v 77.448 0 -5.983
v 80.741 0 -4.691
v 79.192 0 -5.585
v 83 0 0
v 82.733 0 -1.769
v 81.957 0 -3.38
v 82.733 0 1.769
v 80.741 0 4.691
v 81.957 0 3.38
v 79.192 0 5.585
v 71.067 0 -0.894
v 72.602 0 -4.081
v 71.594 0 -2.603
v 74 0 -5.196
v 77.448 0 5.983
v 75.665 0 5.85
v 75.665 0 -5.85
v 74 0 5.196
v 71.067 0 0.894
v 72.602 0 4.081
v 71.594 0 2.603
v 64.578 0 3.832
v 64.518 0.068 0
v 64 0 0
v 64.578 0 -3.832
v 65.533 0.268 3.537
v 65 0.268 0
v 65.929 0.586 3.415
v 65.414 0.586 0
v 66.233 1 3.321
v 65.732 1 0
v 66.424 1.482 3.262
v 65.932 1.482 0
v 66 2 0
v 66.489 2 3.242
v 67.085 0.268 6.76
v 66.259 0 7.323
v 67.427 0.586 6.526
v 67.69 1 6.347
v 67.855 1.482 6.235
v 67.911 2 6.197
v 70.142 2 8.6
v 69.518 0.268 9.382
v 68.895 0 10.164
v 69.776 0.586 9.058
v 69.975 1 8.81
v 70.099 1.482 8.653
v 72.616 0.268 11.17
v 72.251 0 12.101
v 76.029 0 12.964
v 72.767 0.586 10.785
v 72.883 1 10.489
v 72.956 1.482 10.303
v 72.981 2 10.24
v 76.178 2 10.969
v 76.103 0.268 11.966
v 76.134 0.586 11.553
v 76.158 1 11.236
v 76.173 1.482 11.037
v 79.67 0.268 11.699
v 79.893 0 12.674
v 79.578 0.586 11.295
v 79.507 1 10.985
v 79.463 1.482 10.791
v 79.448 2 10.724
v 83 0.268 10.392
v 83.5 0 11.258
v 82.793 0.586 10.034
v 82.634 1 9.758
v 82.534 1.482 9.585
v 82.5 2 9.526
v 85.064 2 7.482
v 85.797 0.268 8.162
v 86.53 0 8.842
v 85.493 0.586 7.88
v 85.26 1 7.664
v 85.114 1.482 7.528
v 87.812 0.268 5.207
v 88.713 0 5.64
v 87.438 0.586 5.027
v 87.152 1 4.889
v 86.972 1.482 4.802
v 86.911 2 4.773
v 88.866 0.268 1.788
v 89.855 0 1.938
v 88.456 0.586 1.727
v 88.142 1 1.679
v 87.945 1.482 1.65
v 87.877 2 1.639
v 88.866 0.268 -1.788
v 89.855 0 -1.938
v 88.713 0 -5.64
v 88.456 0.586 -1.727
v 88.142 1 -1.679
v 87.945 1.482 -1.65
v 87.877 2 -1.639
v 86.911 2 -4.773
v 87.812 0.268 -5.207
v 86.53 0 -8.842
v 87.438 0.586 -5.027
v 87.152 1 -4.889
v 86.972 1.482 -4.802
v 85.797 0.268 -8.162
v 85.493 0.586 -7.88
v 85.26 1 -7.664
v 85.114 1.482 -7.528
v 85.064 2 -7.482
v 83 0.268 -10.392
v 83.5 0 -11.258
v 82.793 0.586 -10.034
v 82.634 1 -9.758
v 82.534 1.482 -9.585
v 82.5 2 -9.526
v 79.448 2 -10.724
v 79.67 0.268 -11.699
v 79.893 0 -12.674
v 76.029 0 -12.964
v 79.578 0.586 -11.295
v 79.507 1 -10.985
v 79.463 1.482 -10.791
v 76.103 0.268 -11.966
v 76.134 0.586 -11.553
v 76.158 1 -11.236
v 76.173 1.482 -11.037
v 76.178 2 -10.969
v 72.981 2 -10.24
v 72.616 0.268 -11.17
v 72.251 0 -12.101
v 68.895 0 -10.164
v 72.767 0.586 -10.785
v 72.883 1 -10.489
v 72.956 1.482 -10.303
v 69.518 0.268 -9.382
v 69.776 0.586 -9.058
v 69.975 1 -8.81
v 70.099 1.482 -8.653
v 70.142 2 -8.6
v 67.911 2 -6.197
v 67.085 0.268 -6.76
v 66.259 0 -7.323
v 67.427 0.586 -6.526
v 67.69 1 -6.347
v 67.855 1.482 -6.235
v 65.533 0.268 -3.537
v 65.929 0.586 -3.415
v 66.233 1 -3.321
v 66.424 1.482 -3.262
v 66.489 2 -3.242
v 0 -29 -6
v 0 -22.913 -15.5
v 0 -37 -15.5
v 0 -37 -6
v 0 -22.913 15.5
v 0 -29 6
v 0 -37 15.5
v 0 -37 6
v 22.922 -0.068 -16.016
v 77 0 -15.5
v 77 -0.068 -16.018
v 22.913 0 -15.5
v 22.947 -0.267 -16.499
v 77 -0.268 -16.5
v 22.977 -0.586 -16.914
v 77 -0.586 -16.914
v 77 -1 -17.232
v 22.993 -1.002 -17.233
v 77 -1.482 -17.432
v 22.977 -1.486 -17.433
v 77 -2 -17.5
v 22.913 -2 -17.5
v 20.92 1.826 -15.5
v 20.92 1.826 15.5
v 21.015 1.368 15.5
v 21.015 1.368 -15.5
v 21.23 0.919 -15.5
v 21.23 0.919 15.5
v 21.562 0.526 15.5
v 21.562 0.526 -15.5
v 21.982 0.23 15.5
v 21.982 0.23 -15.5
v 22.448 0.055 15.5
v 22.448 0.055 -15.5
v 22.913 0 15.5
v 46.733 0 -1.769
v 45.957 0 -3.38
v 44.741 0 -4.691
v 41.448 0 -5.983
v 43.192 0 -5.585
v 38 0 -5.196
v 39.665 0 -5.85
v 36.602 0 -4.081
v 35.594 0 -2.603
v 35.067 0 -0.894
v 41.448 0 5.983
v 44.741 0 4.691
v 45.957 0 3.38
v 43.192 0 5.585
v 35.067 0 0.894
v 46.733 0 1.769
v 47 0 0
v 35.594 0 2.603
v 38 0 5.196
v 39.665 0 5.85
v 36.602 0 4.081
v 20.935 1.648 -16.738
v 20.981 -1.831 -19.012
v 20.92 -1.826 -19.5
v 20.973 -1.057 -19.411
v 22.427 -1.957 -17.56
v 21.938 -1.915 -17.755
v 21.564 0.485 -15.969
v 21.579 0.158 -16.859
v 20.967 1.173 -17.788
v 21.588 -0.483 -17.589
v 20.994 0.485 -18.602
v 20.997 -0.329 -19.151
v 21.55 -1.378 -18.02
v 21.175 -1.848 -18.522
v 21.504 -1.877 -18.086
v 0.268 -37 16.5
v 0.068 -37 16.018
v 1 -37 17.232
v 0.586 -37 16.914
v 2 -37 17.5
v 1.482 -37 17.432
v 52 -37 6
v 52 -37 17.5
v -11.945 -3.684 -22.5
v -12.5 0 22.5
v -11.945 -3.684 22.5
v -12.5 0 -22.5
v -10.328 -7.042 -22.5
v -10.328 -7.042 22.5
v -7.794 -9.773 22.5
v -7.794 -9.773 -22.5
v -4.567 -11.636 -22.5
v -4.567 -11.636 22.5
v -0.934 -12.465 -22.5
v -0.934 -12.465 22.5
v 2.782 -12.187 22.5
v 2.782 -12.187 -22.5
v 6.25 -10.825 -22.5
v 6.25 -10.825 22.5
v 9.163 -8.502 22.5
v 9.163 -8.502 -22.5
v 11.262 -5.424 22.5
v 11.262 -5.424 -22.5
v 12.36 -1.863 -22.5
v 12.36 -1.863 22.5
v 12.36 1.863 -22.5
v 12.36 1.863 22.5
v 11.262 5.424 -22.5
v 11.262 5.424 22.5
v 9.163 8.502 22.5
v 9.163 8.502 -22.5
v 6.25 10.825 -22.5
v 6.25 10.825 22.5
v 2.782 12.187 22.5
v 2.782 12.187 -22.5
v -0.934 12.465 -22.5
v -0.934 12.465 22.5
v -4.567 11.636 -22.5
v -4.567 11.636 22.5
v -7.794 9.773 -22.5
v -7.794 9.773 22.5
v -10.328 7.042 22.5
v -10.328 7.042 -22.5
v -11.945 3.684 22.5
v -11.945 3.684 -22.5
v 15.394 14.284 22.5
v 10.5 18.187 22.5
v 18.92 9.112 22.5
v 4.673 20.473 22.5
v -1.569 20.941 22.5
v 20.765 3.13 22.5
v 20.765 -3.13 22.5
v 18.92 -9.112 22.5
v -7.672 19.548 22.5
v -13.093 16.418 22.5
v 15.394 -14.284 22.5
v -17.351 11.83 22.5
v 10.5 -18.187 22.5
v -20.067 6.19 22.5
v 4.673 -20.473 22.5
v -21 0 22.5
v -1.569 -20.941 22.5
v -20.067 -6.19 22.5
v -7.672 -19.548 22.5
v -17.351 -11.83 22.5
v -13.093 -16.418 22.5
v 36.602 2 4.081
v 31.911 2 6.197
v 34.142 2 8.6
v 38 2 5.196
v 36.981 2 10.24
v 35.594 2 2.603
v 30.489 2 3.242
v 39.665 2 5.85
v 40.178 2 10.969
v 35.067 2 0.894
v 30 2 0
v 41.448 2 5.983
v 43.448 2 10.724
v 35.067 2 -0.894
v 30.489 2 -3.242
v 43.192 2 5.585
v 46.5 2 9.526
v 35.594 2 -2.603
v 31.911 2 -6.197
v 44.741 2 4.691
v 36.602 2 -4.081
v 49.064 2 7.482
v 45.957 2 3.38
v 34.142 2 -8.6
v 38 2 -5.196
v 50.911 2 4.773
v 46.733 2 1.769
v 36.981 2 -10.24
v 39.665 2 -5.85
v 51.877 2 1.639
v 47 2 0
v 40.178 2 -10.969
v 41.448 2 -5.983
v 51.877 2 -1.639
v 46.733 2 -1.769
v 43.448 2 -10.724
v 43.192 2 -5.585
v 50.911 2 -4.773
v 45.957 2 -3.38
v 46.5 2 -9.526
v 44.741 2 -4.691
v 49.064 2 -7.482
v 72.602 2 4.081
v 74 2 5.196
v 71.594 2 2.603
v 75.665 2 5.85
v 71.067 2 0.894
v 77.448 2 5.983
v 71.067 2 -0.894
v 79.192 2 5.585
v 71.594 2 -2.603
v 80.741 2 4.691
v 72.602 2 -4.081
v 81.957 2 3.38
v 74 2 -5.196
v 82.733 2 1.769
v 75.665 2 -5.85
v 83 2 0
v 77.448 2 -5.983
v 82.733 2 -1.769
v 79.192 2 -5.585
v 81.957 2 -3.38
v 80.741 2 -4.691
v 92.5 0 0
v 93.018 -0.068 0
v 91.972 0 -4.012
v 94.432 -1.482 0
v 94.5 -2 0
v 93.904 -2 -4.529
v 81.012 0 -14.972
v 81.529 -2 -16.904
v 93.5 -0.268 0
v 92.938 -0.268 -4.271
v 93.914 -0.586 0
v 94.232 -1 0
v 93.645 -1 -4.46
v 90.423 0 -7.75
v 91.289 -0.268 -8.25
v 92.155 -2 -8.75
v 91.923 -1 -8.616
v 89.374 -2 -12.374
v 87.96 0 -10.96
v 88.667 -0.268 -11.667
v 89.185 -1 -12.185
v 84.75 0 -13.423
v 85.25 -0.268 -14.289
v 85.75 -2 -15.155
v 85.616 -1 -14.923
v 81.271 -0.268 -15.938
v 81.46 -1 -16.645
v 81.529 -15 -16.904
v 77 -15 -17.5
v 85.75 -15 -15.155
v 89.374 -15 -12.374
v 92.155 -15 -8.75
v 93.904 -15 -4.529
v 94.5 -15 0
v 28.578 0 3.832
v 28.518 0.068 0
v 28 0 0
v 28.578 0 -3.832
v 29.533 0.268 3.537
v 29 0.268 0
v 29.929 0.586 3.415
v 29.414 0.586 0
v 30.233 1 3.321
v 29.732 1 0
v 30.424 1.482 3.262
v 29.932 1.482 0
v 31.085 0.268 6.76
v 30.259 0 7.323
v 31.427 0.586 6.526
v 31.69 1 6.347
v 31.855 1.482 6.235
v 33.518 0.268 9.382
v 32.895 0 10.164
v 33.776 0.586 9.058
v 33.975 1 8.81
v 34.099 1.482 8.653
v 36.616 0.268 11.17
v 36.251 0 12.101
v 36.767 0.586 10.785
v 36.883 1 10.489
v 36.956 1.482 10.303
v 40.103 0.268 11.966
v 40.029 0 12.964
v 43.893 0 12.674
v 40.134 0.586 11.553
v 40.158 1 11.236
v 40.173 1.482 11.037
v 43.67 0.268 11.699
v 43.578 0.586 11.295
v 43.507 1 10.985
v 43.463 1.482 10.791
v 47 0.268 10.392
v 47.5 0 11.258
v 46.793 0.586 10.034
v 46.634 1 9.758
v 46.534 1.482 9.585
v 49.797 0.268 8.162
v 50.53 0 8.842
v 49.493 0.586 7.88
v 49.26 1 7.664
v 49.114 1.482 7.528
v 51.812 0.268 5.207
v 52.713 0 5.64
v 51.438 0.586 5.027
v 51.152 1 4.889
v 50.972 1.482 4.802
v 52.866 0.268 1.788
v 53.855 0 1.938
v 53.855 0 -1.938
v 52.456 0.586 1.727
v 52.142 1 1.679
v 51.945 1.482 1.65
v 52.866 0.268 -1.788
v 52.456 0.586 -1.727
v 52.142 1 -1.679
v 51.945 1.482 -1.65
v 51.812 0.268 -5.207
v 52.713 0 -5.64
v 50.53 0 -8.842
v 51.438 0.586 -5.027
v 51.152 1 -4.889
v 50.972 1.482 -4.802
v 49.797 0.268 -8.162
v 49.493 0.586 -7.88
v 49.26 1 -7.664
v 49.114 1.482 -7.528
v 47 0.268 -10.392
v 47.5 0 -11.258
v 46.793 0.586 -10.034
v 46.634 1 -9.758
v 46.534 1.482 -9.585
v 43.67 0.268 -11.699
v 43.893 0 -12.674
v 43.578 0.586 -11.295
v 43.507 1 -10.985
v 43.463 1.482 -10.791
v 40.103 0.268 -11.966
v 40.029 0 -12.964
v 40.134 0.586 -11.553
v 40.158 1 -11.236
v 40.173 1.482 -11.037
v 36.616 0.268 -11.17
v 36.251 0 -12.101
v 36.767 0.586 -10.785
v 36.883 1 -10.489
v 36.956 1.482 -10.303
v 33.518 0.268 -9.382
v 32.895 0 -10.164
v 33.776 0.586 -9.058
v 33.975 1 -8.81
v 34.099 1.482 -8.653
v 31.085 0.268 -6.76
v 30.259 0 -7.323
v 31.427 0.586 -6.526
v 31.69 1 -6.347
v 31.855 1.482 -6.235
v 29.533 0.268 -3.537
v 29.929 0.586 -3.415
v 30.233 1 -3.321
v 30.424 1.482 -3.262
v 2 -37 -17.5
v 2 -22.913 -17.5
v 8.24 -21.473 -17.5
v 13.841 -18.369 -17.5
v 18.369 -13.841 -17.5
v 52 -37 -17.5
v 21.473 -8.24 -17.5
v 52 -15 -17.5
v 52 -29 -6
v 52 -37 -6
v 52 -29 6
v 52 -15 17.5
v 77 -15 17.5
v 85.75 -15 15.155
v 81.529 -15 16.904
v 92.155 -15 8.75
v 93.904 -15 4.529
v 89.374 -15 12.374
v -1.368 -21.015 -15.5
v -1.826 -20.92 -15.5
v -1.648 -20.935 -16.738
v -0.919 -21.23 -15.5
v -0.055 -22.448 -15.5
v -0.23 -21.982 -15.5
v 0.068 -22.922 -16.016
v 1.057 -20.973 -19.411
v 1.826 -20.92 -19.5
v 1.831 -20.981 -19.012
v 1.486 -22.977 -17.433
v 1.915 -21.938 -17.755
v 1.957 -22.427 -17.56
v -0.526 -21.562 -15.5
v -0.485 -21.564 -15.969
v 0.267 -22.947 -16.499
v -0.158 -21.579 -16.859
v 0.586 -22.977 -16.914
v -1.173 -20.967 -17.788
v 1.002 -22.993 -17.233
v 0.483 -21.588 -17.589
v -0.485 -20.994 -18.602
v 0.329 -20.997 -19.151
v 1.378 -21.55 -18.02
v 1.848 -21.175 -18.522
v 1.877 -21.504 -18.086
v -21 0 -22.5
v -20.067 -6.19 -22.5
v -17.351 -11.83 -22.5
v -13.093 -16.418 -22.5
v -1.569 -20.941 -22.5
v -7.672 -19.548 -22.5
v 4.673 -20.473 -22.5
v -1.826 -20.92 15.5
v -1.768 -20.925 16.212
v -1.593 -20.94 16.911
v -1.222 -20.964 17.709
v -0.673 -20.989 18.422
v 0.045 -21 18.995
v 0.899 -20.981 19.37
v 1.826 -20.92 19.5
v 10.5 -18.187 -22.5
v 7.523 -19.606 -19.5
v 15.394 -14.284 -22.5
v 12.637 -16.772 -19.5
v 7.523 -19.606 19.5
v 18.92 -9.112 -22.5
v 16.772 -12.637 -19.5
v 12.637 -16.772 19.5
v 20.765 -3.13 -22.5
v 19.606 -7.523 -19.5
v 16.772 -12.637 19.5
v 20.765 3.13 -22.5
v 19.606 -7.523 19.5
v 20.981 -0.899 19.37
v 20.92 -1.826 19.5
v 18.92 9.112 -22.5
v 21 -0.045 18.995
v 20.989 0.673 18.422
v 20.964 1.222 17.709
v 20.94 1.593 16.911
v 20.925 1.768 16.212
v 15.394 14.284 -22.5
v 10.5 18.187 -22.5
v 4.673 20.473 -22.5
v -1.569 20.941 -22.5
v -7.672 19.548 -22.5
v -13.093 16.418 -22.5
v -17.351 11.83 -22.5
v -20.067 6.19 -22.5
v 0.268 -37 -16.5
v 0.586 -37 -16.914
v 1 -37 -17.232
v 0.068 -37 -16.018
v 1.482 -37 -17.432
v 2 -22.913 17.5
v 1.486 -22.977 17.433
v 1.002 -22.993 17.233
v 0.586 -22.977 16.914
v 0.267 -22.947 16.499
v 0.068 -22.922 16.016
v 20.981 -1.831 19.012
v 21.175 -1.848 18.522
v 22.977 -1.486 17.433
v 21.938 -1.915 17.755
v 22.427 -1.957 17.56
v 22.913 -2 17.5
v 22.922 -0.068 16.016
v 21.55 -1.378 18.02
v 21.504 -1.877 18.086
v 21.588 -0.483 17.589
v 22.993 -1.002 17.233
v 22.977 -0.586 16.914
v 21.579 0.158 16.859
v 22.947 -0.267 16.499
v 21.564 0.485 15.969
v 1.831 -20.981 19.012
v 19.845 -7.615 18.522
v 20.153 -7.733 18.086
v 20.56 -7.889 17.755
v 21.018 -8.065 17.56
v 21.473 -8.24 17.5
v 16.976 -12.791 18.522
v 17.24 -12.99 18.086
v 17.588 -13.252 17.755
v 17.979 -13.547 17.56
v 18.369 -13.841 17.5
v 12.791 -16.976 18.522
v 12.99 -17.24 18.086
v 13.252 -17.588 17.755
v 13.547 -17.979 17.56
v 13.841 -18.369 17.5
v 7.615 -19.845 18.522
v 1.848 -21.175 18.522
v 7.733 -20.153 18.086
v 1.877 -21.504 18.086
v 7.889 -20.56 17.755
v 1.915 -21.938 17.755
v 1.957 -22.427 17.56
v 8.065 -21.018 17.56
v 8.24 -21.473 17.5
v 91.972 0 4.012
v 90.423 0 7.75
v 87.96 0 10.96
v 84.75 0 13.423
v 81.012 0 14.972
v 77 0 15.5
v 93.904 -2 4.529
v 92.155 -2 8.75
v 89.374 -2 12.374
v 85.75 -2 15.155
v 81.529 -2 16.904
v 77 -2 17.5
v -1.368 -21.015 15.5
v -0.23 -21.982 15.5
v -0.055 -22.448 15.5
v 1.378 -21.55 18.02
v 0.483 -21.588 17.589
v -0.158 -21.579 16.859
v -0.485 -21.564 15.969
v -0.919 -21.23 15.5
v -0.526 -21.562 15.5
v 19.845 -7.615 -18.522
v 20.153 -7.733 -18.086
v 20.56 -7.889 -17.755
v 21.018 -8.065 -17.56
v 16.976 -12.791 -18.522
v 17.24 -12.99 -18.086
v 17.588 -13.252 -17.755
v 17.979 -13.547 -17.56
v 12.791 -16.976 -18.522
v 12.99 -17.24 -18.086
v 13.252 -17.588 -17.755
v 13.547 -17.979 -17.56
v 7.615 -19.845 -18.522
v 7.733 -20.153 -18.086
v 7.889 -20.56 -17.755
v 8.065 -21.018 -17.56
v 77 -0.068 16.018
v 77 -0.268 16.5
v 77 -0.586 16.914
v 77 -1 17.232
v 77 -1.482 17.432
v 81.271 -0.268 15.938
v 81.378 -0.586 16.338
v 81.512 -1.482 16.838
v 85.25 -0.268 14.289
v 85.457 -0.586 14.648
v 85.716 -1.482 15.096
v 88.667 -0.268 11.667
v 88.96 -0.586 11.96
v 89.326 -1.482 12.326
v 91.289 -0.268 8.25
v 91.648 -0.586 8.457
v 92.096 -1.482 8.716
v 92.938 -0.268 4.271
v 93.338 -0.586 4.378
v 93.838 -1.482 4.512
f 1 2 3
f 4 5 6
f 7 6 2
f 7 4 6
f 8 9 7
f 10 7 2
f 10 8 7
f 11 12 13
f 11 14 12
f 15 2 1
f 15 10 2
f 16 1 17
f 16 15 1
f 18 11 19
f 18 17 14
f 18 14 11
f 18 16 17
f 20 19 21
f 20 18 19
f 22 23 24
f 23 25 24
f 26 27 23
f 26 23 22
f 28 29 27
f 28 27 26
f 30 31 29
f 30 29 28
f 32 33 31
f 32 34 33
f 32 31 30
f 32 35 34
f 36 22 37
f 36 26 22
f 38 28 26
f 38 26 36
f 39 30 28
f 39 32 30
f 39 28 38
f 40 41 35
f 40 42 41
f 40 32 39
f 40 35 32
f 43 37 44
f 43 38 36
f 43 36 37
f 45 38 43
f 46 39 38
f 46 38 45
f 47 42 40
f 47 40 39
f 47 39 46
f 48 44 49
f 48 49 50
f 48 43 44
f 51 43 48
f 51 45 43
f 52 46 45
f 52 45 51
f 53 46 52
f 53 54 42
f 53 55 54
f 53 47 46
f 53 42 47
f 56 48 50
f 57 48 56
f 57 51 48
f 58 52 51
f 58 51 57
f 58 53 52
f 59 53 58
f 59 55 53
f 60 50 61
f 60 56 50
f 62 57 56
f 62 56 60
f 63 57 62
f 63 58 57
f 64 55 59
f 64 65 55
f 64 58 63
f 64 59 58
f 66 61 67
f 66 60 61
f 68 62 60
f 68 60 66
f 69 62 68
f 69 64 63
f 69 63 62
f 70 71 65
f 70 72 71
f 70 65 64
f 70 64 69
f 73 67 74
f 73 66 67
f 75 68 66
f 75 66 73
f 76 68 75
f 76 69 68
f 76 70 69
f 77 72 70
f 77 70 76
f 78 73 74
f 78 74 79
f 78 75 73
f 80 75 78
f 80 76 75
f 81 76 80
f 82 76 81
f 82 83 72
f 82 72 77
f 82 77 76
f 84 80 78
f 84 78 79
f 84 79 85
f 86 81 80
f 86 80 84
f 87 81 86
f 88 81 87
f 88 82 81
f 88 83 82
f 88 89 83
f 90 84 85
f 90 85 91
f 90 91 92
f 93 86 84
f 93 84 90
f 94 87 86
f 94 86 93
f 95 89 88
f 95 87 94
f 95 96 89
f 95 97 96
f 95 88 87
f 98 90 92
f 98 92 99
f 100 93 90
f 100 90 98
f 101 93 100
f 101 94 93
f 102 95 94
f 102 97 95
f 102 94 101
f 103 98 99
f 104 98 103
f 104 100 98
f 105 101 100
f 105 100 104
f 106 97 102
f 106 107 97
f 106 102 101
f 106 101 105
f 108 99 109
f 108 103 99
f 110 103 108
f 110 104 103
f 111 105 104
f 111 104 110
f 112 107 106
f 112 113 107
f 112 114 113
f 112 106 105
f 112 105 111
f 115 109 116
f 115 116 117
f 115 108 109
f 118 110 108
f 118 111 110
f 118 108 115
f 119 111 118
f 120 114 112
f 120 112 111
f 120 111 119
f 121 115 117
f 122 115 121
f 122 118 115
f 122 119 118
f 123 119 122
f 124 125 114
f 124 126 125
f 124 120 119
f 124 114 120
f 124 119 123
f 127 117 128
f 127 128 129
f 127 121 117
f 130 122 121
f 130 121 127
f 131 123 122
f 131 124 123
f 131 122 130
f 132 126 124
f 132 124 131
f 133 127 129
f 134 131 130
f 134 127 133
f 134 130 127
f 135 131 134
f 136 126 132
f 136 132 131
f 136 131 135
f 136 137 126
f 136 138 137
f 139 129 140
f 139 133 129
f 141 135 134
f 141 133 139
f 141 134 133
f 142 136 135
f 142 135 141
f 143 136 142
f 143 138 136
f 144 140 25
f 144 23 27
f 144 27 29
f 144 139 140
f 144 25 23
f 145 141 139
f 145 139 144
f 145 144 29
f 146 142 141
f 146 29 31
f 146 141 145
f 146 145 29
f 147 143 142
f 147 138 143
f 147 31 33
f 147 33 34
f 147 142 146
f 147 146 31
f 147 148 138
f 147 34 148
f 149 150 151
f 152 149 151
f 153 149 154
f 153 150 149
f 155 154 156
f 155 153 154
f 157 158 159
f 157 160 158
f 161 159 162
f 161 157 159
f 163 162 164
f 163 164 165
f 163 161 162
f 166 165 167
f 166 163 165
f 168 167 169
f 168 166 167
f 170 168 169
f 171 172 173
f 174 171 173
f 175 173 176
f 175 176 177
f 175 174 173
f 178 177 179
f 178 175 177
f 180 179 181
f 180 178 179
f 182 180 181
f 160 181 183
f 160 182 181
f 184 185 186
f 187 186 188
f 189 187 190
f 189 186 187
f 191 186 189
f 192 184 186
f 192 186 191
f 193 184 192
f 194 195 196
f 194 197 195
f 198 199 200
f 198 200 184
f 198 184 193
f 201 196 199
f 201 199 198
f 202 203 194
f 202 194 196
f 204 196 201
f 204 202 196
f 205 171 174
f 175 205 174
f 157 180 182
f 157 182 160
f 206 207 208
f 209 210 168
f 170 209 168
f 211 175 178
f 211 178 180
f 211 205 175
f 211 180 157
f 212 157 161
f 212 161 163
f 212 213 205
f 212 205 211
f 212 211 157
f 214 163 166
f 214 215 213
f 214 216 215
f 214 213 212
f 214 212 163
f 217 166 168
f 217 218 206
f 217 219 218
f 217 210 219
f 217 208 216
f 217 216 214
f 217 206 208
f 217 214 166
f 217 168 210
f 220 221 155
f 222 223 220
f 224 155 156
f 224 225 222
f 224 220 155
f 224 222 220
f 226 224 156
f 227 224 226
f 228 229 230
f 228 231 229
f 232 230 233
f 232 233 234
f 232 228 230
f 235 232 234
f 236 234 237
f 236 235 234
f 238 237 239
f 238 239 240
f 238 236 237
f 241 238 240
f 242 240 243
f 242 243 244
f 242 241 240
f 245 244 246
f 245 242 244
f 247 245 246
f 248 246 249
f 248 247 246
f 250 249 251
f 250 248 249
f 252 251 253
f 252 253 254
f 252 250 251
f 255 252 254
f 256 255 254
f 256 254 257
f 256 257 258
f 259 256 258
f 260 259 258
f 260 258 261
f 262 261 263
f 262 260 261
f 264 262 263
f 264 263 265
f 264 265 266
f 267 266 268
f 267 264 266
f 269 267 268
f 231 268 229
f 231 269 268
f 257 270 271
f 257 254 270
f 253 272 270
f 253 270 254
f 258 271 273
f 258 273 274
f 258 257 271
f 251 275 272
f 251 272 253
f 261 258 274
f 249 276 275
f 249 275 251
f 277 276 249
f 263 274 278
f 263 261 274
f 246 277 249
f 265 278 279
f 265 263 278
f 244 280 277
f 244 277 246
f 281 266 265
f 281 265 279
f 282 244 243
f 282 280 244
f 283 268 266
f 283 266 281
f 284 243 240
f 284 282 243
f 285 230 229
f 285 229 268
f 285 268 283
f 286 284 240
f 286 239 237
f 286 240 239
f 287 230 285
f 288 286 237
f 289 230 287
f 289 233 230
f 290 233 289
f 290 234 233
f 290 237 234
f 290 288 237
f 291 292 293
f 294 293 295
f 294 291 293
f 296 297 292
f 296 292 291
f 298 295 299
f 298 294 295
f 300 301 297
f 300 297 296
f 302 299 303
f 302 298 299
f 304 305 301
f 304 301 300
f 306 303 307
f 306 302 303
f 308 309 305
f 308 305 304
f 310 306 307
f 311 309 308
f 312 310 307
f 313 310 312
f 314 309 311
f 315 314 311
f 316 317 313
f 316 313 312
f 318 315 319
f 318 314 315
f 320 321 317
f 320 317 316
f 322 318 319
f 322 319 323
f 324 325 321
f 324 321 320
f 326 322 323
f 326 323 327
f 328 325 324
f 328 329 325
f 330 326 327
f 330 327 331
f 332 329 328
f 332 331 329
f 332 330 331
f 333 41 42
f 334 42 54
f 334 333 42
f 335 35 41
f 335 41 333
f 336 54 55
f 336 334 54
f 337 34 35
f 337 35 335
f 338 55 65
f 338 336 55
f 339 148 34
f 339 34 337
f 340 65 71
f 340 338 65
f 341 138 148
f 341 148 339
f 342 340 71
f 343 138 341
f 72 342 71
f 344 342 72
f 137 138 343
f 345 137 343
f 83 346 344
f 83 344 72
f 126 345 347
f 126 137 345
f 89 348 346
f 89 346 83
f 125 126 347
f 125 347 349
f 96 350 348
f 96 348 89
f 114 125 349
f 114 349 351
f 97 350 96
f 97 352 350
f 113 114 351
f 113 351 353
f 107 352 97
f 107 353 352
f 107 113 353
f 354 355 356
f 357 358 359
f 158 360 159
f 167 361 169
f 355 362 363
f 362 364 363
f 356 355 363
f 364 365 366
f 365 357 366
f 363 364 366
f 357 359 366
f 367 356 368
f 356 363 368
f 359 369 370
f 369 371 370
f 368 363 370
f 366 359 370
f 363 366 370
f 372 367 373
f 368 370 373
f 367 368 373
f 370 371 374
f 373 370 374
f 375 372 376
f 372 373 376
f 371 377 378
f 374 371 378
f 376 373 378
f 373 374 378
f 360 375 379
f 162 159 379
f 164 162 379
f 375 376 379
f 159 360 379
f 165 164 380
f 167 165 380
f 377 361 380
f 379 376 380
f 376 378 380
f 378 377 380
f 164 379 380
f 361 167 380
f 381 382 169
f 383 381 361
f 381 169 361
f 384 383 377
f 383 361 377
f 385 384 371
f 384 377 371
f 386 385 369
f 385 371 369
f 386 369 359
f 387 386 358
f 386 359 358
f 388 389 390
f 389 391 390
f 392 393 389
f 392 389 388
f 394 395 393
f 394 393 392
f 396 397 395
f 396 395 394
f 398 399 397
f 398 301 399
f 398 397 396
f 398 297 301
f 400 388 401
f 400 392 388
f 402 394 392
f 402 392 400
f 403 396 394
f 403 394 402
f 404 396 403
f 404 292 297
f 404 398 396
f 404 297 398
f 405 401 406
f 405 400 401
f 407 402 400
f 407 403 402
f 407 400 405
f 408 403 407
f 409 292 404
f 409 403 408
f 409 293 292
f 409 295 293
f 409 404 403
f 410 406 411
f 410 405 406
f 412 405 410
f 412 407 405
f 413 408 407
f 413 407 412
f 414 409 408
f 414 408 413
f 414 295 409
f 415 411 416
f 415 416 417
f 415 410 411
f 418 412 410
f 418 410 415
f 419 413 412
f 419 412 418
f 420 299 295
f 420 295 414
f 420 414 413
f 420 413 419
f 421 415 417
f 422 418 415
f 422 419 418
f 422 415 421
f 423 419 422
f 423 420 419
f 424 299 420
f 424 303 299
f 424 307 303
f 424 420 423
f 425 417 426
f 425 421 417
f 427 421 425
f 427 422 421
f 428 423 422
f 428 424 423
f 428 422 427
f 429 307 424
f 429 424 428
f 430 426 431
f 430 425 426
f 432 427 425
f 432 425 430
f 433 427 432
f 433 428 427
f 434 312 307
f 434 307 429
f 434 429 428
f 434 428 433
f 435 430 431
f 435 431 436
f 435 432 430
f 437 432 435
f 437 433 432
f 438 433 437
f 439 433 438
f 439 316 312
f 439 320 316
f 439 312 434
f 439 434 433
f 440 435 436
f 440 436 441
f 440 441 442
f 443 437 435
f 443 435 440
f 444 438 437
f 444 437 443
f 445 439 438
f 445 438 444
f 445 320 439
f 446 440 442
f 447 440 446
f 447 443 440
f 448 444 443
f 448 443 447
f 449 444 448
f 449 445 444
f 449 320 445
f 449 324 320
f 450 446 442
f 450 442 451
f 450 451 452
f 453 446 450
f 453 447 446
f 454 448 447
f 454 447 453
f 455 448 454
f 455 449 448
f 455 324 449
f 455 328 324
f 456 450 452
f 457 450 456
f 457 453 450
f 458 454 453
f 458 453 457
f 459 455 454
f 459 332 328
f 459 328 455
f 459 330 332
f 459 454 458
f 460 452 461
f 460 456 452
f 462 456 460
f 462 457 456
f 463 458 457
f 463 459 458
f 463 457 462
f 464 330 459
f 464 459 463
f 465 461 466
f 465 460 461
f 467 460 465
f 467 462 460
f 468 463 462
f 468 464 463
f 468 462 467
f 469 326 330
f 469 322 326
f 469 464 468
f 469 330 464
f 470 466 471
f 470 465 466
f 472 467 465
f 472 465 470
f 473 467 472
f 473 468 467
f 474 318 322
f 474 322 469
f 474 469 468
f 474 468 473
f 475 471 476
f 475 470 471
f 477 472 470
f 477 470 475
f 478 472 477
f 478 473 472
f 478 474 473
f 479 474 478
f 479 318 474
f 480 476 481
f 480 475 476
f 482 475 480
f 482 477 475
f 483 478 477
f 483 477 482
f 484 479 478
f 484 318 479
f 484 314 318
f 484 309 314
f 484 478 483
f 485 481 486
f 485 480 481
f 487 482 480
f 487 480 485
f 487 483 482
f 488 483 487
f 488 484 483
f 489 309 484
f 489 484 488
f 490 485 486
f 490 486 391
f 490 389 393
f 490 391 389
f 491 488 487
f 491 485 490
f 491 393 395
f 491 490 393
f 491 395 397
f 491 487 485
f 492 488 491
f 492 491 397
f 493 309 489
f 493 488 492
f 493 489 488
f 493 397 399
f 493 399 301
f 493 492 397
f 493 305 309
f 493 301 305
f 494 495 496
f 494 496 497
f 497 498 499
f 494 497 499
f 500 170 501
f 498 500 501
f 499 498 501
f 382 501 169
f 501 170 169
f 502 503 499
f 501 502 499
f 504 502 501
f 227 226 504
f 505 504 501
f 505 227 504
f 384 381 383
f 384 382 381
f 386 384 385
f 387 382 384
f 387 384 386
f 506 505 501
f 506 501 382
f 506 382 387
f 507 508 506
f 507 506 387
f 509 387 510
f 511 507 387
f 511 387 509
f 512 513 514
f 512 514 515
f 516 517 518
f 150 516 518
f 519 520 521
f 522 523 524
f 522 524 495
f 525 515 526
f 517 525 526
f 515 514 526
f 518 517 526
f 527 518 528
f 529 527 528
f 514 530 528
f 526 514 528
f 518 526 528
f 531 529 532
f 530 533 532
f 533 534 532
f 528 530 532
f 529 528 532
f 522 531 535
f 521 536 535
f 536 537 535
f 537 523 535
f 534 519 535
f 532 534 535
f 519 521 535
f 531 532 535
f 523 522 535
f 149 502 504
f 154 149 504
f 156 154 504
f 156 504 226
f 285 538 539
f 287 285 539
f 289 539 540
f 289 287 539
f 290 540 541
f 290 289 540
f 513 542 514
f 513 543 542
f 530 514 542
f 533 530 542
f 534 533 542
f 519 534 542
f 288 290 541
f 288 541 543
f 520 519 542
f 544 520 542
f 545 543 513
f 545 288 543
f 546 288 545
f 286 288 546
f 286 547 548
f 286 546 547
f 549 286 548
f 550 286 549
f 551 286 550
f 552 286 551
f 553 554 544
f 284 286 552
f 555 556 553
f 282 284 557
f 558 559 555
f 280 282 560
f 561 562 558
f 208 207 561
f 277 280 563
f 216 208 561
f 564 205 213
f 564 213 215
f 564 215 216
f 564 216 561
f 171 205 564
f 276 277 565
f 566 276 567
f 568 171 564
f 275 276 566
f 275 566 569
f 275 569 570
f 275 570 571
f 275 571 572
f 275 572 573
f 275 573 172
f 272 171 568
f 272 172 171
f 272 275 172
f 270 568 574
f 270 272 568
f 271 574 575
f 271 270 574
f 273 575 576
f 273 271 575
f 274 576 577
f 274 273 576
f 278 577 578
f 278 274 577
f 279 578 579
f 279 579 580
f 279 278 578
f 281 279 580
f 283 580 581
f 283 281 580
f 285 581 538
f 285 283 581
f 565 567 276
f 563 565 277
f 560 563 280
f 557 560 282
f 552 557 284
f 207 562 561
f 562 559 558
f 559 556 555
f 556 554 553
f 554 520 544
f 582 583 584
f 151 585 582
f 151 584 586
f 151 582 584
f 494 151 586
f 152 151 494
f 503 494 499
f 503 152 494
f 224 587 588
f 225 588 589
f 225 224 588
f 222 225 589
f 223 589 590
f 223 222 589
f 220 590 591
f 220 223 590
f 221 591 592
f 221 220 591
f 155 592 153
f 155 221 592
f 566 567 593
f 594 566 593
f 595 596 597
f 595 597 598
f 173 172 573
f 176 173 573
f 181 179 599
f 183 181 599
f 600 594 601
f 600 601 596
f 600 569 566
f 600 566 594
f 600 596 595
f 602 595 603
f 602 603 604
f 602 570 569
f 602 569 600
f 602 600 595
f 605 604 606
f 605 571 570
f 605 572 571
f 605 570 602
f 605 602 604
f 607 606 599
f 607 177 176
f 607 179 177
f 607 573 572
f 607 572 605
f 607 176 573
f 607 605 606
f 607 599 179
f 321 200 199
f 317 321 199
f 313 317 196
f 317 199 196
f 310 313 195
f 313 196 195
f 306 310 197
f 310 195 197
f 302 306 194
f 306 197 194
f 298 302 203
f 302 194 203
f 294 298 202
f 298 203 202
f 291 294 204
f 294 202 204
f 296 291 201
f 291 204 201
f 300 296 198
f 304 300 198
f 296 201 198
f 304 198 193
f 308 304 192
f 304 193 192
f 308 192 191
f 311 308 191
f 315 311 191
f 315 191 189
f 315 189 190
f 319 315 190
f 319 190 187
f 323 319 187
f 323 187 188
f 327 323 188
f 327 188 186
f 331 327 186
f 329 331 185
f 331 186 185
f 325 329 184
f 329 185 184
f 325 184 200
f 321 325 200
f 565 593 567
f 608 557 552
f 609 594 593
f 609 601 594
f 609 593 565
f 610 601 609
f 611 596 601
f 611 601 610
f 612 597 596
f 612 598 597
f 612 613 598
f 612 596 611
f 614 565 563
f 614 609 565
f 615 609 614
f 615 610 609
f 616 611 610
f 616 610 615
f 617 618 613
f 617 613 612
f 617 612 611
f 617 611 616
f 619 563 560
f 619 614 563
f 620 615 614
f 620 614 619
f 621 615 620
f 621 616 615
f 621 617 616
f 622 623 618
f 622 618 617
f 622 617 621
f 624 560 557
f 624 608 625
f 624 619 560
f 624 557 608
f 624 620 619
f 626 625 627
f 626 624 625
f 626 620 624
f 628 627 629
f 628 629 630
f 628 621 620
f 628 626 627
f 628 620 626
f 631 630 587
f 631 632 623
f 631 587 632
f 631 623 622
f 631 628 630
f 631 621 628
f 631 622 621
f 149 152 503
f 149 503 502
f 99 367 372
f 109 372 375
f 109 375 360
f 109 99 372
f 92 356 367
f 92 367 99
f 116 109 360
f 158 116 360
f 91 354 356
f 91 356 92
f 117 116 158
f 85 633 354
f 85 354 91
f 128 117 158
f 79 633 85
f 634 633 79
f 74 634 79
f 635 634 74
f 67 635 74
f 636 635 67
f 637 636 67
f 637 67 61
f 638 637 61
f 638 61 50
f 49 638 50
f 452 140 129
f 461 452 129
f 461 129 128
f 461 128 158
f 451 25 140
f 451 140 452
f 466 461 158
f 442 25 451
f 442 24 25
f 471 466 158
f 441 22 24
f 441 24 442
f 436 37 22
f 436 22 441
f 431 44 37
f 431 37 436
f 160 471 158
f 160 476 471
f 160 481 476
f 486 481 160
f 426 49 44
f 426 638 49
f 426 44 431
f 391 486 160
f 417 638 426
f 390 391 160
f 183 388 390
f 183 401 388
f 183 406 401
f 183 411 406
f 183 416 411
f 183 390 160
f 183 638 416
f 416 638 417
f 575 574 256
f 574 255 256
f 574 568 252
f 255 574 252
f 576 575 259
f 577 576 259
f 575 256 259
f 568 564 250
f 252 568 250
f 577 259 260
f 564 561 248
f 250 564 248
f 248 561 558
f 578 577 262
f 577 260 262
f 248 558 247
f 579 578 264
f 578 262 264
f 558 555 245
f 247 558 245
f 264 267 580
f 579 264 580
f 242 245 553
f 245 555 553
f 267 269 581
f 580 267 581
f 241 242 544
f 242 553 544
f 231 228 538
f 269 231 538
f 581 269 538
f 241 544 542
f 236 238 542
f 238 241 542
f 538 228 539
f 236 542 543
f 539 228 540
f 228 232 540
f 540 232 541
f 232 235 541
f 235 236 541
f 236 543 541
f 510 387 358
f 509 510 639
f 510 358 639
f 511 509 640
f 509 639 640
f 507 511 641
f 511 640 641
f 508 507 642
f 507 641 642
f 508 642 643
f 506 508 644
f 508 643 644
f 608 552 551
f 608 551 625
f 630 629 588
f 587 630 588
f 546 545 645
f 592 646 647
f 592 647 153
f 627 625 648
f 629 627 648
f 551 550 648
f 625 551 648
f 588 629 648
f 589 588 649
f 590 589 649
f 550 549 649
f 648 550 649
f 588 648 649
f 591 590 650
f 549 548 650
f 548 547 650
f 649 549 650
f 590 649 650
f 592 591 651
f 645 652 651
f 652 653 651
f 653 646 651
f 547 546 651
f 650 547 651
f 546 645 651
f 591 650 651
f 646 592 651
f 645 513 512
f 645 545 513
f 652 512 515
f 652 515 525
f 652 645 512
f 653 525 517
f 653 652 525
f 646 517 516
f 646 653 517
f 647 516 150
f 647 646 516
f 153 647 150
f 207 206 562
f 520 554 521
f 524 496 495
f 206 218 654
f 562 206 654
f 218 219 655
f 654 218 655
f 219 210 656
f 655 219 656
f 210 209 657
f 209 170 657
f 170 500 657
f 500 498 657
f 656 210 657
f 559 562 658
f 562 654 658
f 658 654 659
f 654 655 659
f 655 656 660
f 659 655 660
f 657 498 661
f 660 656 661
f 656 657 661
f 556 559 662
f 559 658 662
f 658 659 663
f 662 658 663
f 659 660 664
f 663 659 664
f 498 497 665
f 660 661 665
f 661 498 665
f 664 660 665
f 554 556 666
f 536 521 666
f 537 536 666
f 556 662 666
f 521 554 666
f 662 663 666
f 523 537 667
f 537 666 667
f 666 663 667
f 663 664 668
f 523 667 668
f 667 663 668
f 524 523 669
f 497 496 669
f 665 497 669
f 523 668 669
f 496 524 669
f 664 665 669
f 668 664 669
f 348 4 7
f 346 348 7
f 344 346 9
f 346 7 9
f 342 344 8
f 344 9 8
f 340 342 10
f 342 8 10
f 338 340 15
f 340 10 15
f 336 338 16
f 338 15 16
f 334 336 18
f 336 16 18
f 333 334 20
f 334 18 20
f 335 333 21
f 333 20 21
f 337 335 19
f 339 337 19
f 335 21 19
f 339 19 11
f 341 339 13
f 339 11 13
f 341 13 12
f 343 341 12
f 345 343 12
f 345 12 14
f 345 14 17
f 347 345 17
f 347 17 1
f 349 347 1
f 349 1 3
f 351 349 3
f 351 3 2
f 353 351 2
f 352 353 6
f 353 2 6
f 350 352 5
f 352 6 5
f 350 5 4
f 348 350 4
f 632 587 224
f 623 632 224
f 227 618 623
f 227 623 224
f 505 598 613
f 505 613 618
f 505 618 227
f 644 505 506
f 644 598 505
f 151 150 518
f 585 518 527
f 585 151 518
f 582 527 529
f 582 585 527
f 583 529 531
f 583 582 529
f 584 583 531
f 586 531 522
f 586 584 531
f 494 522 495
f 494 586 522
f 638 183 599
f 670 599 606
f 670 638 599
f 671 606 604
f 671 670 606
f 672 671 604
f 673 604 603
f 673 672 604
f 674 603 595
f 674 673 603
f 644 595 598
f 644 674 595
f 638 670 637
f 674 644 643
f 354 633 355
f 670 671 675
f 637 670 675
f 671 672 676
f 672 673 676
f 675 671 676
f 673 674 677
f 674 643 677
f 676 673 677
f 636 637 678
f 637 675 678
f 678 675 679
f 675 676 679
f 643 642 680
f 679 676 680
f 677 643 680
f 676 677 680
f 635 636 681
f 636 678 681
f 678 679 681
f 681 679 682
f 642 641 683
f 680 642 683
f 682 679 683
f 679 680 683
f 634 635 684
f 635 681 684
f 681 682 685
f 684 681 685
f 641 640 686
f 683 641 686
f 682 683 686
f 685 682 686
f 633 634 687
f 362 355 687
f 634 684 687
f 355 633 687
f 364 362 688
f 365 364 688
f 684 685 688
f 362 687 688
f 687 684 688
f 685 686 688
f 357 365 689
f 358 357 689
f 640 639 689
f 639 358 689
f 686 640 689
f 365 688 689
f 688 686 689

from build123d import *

# Parameters (mm, degrees)
SKETCH3_R               = 21
SKETCH3_R_2             = 12.5
BOSS_EXTRUDE1_DEPTH     = 22.5
BOSS_EXTRUDE2_DEPTH     = 17.5
CUT_EXTRUDE1_DEPTH      = 85.877853413
CUT_EXTRUDE1_DEPTH_BACK = 53
BOSS_EXTRUDE3_DEPTH     = 2
CUT_EXTRUDE2_REACH      = 121.386
FILLET1_R               = 2


with BuildPart() as part:
    # Sketch3 → Boss-Extrude1 (new, symmetric)
    with BuildSketch(Plane.XY):
        with Locations(Location((0, 0, 0), (0, 0, 180))):
            Circle(SKETCH3_R)
        with Locations(Location((0, 0, 0), (0, 0, 180))):
            Circle(SKETCH3_R_2, mode=Mode.SUBTRACT)
    extrude(amount=BOSS_EXTRUDE1_DEPTH, both=True)

    # Sketch3<3> → Boss-Extrude2 (add, symmetric)
    with BuildSketch(Plane.XY):
        with BuildLine():
            ThreePointArc((21, 0), (14.849242405, -14.849242405), (0, -21))
            Line((0, -21), (0, -37))
            Line((0, -37), (52, -37))
            Line((52, -37), (52, -15))
            Line((52, -15), (111.255819071, -15))
            Line((111.255819071, -15), (111.255819071, 0))
            Line((111.255819071, 0), (21, 0))
        make_face()
    extrude(amount=BOSS_EXTRUDE2_DEPTH, both=True)

    # Sketch5 → Cut-Extrude1 (cut, two sides: drawn at the far end of the back side and taken through both)
    with BuildSketch(Plane(origin=(52, 0, 0), x_dir=(0, 0, -1), z_dir=(1, 0, 0)).offset(-CUT_EXTRUDE1_DEPTH_BACK)):
        Polygon((6, -176.247823966), (6, -37), (6, -29), (-6, -29), (-6, -37), (-6, -176.247823966), (-6, -454.743471899), (6, -454.743471899), align=None)
    extrude(amount=CUT_EXTRUDE1_DEPTH + CUT_EXTRUDE1_DEPTH_BACK, mode=Mode.SUBTRACT)

    # Sketch4 → Boss-Extrude3 (add)
    with BuildSketch(Plane(origin=(0, 0, 0), x_dir=(1, 0, 0), z_dir=(0, 1, 0))):
        with BuildLine():
            ThreePointArc((35, 0), (41, 6), (47, 0))
            Line((47, 0), (52, 0))
            ThreePointArc((52, 0), (41, 11), (30, 0))
            Line((30, 0), (35, 0))
        make_face()
        with BuildLine():
            Line((52, 0), (47, 0))
            ThreePointArc((47, 0), (41, -6), (35, 0))
            Line((35, 0), (30, 0))
            ThreePointArc((30, 0), (41, -11), (52, 0))
        make_face()
        with BuildLine():
            ThreePointArc((88, 0), (77, 11), (66, 0))
            Line((66, 0), (71, 0))
            ThreePointArc((71, 0), (77, 6), (83, 0))
            Line((83, 0), (88, 0))
        make_face()
        with BuildLine():
            Line((71, 0), (66, 0))
            ThreePointArc((66, 0), (77, -11), (88, 0))
            Line((88, 0), (83, 0))
            ThreePointArc((83, 0), (77, -6), (71, 0))
        make_face()
    extrude(amount=BOSS_EXTRUDE3_DEPTH)

    # Sketch4<3> → Cut-Extrude2 (cut, up to next)
    with BuildSketch(Plane(origin=(0, 0, 0), x_dir=(1, 0, 0), z_dir=(0, 1, 0)), mode=Mode.PRIVATE) as cut_extrude2_sk1:
        with BuildLine():
            ThreePointArc((77, 17.5), (89.374368671, 12.374368671), (94.5, 0))
            ThreePointArc((94.5, 0), (89.374368671, -12.374368671), (77, -17.5))
            Line((77, -17.5), (111.255819071, -17.5))
            Line((111.255819071, -17.5), (111.255819071, 17.5))
            Line((111.255819071, 17.5), (77, 17.5))
        make_face()
    cut_extrude2_tool1 = extrude(cut_extrude2_sk1.sketch, amount=-CUT_EXTRUDE2_REACH, mode=Mode.PRIVATE) & part.part
    add(cut_extrude2_tool1.solids().sort_by_distance((100.628245, 0, 0))[0], mode=Mode.SUBTRACT)

    # Fillet1
    fillet1_edges = [part.edges().sort_by_distance(p)[0] for p in [
        (14.849242405, -14.849242405, 17.5),
        (21, 0, 0),
        (0, -29, -17.5),
        (0, -21, 0),
        (0, -29, 17.5),
        (14.849242405, -14.849242405, -17.5),
        (66, 0, 0),
        (30, 0, 0),
        (49, 0, -17.5),
        (49, 0, 17.5),
        (94.5, 0, 0),
    ]]
    fillet(fillet1_edges, radius=FILLET1_R - 0.0001)  # a hair under: the kernel refuses the full size


solid = part.part
